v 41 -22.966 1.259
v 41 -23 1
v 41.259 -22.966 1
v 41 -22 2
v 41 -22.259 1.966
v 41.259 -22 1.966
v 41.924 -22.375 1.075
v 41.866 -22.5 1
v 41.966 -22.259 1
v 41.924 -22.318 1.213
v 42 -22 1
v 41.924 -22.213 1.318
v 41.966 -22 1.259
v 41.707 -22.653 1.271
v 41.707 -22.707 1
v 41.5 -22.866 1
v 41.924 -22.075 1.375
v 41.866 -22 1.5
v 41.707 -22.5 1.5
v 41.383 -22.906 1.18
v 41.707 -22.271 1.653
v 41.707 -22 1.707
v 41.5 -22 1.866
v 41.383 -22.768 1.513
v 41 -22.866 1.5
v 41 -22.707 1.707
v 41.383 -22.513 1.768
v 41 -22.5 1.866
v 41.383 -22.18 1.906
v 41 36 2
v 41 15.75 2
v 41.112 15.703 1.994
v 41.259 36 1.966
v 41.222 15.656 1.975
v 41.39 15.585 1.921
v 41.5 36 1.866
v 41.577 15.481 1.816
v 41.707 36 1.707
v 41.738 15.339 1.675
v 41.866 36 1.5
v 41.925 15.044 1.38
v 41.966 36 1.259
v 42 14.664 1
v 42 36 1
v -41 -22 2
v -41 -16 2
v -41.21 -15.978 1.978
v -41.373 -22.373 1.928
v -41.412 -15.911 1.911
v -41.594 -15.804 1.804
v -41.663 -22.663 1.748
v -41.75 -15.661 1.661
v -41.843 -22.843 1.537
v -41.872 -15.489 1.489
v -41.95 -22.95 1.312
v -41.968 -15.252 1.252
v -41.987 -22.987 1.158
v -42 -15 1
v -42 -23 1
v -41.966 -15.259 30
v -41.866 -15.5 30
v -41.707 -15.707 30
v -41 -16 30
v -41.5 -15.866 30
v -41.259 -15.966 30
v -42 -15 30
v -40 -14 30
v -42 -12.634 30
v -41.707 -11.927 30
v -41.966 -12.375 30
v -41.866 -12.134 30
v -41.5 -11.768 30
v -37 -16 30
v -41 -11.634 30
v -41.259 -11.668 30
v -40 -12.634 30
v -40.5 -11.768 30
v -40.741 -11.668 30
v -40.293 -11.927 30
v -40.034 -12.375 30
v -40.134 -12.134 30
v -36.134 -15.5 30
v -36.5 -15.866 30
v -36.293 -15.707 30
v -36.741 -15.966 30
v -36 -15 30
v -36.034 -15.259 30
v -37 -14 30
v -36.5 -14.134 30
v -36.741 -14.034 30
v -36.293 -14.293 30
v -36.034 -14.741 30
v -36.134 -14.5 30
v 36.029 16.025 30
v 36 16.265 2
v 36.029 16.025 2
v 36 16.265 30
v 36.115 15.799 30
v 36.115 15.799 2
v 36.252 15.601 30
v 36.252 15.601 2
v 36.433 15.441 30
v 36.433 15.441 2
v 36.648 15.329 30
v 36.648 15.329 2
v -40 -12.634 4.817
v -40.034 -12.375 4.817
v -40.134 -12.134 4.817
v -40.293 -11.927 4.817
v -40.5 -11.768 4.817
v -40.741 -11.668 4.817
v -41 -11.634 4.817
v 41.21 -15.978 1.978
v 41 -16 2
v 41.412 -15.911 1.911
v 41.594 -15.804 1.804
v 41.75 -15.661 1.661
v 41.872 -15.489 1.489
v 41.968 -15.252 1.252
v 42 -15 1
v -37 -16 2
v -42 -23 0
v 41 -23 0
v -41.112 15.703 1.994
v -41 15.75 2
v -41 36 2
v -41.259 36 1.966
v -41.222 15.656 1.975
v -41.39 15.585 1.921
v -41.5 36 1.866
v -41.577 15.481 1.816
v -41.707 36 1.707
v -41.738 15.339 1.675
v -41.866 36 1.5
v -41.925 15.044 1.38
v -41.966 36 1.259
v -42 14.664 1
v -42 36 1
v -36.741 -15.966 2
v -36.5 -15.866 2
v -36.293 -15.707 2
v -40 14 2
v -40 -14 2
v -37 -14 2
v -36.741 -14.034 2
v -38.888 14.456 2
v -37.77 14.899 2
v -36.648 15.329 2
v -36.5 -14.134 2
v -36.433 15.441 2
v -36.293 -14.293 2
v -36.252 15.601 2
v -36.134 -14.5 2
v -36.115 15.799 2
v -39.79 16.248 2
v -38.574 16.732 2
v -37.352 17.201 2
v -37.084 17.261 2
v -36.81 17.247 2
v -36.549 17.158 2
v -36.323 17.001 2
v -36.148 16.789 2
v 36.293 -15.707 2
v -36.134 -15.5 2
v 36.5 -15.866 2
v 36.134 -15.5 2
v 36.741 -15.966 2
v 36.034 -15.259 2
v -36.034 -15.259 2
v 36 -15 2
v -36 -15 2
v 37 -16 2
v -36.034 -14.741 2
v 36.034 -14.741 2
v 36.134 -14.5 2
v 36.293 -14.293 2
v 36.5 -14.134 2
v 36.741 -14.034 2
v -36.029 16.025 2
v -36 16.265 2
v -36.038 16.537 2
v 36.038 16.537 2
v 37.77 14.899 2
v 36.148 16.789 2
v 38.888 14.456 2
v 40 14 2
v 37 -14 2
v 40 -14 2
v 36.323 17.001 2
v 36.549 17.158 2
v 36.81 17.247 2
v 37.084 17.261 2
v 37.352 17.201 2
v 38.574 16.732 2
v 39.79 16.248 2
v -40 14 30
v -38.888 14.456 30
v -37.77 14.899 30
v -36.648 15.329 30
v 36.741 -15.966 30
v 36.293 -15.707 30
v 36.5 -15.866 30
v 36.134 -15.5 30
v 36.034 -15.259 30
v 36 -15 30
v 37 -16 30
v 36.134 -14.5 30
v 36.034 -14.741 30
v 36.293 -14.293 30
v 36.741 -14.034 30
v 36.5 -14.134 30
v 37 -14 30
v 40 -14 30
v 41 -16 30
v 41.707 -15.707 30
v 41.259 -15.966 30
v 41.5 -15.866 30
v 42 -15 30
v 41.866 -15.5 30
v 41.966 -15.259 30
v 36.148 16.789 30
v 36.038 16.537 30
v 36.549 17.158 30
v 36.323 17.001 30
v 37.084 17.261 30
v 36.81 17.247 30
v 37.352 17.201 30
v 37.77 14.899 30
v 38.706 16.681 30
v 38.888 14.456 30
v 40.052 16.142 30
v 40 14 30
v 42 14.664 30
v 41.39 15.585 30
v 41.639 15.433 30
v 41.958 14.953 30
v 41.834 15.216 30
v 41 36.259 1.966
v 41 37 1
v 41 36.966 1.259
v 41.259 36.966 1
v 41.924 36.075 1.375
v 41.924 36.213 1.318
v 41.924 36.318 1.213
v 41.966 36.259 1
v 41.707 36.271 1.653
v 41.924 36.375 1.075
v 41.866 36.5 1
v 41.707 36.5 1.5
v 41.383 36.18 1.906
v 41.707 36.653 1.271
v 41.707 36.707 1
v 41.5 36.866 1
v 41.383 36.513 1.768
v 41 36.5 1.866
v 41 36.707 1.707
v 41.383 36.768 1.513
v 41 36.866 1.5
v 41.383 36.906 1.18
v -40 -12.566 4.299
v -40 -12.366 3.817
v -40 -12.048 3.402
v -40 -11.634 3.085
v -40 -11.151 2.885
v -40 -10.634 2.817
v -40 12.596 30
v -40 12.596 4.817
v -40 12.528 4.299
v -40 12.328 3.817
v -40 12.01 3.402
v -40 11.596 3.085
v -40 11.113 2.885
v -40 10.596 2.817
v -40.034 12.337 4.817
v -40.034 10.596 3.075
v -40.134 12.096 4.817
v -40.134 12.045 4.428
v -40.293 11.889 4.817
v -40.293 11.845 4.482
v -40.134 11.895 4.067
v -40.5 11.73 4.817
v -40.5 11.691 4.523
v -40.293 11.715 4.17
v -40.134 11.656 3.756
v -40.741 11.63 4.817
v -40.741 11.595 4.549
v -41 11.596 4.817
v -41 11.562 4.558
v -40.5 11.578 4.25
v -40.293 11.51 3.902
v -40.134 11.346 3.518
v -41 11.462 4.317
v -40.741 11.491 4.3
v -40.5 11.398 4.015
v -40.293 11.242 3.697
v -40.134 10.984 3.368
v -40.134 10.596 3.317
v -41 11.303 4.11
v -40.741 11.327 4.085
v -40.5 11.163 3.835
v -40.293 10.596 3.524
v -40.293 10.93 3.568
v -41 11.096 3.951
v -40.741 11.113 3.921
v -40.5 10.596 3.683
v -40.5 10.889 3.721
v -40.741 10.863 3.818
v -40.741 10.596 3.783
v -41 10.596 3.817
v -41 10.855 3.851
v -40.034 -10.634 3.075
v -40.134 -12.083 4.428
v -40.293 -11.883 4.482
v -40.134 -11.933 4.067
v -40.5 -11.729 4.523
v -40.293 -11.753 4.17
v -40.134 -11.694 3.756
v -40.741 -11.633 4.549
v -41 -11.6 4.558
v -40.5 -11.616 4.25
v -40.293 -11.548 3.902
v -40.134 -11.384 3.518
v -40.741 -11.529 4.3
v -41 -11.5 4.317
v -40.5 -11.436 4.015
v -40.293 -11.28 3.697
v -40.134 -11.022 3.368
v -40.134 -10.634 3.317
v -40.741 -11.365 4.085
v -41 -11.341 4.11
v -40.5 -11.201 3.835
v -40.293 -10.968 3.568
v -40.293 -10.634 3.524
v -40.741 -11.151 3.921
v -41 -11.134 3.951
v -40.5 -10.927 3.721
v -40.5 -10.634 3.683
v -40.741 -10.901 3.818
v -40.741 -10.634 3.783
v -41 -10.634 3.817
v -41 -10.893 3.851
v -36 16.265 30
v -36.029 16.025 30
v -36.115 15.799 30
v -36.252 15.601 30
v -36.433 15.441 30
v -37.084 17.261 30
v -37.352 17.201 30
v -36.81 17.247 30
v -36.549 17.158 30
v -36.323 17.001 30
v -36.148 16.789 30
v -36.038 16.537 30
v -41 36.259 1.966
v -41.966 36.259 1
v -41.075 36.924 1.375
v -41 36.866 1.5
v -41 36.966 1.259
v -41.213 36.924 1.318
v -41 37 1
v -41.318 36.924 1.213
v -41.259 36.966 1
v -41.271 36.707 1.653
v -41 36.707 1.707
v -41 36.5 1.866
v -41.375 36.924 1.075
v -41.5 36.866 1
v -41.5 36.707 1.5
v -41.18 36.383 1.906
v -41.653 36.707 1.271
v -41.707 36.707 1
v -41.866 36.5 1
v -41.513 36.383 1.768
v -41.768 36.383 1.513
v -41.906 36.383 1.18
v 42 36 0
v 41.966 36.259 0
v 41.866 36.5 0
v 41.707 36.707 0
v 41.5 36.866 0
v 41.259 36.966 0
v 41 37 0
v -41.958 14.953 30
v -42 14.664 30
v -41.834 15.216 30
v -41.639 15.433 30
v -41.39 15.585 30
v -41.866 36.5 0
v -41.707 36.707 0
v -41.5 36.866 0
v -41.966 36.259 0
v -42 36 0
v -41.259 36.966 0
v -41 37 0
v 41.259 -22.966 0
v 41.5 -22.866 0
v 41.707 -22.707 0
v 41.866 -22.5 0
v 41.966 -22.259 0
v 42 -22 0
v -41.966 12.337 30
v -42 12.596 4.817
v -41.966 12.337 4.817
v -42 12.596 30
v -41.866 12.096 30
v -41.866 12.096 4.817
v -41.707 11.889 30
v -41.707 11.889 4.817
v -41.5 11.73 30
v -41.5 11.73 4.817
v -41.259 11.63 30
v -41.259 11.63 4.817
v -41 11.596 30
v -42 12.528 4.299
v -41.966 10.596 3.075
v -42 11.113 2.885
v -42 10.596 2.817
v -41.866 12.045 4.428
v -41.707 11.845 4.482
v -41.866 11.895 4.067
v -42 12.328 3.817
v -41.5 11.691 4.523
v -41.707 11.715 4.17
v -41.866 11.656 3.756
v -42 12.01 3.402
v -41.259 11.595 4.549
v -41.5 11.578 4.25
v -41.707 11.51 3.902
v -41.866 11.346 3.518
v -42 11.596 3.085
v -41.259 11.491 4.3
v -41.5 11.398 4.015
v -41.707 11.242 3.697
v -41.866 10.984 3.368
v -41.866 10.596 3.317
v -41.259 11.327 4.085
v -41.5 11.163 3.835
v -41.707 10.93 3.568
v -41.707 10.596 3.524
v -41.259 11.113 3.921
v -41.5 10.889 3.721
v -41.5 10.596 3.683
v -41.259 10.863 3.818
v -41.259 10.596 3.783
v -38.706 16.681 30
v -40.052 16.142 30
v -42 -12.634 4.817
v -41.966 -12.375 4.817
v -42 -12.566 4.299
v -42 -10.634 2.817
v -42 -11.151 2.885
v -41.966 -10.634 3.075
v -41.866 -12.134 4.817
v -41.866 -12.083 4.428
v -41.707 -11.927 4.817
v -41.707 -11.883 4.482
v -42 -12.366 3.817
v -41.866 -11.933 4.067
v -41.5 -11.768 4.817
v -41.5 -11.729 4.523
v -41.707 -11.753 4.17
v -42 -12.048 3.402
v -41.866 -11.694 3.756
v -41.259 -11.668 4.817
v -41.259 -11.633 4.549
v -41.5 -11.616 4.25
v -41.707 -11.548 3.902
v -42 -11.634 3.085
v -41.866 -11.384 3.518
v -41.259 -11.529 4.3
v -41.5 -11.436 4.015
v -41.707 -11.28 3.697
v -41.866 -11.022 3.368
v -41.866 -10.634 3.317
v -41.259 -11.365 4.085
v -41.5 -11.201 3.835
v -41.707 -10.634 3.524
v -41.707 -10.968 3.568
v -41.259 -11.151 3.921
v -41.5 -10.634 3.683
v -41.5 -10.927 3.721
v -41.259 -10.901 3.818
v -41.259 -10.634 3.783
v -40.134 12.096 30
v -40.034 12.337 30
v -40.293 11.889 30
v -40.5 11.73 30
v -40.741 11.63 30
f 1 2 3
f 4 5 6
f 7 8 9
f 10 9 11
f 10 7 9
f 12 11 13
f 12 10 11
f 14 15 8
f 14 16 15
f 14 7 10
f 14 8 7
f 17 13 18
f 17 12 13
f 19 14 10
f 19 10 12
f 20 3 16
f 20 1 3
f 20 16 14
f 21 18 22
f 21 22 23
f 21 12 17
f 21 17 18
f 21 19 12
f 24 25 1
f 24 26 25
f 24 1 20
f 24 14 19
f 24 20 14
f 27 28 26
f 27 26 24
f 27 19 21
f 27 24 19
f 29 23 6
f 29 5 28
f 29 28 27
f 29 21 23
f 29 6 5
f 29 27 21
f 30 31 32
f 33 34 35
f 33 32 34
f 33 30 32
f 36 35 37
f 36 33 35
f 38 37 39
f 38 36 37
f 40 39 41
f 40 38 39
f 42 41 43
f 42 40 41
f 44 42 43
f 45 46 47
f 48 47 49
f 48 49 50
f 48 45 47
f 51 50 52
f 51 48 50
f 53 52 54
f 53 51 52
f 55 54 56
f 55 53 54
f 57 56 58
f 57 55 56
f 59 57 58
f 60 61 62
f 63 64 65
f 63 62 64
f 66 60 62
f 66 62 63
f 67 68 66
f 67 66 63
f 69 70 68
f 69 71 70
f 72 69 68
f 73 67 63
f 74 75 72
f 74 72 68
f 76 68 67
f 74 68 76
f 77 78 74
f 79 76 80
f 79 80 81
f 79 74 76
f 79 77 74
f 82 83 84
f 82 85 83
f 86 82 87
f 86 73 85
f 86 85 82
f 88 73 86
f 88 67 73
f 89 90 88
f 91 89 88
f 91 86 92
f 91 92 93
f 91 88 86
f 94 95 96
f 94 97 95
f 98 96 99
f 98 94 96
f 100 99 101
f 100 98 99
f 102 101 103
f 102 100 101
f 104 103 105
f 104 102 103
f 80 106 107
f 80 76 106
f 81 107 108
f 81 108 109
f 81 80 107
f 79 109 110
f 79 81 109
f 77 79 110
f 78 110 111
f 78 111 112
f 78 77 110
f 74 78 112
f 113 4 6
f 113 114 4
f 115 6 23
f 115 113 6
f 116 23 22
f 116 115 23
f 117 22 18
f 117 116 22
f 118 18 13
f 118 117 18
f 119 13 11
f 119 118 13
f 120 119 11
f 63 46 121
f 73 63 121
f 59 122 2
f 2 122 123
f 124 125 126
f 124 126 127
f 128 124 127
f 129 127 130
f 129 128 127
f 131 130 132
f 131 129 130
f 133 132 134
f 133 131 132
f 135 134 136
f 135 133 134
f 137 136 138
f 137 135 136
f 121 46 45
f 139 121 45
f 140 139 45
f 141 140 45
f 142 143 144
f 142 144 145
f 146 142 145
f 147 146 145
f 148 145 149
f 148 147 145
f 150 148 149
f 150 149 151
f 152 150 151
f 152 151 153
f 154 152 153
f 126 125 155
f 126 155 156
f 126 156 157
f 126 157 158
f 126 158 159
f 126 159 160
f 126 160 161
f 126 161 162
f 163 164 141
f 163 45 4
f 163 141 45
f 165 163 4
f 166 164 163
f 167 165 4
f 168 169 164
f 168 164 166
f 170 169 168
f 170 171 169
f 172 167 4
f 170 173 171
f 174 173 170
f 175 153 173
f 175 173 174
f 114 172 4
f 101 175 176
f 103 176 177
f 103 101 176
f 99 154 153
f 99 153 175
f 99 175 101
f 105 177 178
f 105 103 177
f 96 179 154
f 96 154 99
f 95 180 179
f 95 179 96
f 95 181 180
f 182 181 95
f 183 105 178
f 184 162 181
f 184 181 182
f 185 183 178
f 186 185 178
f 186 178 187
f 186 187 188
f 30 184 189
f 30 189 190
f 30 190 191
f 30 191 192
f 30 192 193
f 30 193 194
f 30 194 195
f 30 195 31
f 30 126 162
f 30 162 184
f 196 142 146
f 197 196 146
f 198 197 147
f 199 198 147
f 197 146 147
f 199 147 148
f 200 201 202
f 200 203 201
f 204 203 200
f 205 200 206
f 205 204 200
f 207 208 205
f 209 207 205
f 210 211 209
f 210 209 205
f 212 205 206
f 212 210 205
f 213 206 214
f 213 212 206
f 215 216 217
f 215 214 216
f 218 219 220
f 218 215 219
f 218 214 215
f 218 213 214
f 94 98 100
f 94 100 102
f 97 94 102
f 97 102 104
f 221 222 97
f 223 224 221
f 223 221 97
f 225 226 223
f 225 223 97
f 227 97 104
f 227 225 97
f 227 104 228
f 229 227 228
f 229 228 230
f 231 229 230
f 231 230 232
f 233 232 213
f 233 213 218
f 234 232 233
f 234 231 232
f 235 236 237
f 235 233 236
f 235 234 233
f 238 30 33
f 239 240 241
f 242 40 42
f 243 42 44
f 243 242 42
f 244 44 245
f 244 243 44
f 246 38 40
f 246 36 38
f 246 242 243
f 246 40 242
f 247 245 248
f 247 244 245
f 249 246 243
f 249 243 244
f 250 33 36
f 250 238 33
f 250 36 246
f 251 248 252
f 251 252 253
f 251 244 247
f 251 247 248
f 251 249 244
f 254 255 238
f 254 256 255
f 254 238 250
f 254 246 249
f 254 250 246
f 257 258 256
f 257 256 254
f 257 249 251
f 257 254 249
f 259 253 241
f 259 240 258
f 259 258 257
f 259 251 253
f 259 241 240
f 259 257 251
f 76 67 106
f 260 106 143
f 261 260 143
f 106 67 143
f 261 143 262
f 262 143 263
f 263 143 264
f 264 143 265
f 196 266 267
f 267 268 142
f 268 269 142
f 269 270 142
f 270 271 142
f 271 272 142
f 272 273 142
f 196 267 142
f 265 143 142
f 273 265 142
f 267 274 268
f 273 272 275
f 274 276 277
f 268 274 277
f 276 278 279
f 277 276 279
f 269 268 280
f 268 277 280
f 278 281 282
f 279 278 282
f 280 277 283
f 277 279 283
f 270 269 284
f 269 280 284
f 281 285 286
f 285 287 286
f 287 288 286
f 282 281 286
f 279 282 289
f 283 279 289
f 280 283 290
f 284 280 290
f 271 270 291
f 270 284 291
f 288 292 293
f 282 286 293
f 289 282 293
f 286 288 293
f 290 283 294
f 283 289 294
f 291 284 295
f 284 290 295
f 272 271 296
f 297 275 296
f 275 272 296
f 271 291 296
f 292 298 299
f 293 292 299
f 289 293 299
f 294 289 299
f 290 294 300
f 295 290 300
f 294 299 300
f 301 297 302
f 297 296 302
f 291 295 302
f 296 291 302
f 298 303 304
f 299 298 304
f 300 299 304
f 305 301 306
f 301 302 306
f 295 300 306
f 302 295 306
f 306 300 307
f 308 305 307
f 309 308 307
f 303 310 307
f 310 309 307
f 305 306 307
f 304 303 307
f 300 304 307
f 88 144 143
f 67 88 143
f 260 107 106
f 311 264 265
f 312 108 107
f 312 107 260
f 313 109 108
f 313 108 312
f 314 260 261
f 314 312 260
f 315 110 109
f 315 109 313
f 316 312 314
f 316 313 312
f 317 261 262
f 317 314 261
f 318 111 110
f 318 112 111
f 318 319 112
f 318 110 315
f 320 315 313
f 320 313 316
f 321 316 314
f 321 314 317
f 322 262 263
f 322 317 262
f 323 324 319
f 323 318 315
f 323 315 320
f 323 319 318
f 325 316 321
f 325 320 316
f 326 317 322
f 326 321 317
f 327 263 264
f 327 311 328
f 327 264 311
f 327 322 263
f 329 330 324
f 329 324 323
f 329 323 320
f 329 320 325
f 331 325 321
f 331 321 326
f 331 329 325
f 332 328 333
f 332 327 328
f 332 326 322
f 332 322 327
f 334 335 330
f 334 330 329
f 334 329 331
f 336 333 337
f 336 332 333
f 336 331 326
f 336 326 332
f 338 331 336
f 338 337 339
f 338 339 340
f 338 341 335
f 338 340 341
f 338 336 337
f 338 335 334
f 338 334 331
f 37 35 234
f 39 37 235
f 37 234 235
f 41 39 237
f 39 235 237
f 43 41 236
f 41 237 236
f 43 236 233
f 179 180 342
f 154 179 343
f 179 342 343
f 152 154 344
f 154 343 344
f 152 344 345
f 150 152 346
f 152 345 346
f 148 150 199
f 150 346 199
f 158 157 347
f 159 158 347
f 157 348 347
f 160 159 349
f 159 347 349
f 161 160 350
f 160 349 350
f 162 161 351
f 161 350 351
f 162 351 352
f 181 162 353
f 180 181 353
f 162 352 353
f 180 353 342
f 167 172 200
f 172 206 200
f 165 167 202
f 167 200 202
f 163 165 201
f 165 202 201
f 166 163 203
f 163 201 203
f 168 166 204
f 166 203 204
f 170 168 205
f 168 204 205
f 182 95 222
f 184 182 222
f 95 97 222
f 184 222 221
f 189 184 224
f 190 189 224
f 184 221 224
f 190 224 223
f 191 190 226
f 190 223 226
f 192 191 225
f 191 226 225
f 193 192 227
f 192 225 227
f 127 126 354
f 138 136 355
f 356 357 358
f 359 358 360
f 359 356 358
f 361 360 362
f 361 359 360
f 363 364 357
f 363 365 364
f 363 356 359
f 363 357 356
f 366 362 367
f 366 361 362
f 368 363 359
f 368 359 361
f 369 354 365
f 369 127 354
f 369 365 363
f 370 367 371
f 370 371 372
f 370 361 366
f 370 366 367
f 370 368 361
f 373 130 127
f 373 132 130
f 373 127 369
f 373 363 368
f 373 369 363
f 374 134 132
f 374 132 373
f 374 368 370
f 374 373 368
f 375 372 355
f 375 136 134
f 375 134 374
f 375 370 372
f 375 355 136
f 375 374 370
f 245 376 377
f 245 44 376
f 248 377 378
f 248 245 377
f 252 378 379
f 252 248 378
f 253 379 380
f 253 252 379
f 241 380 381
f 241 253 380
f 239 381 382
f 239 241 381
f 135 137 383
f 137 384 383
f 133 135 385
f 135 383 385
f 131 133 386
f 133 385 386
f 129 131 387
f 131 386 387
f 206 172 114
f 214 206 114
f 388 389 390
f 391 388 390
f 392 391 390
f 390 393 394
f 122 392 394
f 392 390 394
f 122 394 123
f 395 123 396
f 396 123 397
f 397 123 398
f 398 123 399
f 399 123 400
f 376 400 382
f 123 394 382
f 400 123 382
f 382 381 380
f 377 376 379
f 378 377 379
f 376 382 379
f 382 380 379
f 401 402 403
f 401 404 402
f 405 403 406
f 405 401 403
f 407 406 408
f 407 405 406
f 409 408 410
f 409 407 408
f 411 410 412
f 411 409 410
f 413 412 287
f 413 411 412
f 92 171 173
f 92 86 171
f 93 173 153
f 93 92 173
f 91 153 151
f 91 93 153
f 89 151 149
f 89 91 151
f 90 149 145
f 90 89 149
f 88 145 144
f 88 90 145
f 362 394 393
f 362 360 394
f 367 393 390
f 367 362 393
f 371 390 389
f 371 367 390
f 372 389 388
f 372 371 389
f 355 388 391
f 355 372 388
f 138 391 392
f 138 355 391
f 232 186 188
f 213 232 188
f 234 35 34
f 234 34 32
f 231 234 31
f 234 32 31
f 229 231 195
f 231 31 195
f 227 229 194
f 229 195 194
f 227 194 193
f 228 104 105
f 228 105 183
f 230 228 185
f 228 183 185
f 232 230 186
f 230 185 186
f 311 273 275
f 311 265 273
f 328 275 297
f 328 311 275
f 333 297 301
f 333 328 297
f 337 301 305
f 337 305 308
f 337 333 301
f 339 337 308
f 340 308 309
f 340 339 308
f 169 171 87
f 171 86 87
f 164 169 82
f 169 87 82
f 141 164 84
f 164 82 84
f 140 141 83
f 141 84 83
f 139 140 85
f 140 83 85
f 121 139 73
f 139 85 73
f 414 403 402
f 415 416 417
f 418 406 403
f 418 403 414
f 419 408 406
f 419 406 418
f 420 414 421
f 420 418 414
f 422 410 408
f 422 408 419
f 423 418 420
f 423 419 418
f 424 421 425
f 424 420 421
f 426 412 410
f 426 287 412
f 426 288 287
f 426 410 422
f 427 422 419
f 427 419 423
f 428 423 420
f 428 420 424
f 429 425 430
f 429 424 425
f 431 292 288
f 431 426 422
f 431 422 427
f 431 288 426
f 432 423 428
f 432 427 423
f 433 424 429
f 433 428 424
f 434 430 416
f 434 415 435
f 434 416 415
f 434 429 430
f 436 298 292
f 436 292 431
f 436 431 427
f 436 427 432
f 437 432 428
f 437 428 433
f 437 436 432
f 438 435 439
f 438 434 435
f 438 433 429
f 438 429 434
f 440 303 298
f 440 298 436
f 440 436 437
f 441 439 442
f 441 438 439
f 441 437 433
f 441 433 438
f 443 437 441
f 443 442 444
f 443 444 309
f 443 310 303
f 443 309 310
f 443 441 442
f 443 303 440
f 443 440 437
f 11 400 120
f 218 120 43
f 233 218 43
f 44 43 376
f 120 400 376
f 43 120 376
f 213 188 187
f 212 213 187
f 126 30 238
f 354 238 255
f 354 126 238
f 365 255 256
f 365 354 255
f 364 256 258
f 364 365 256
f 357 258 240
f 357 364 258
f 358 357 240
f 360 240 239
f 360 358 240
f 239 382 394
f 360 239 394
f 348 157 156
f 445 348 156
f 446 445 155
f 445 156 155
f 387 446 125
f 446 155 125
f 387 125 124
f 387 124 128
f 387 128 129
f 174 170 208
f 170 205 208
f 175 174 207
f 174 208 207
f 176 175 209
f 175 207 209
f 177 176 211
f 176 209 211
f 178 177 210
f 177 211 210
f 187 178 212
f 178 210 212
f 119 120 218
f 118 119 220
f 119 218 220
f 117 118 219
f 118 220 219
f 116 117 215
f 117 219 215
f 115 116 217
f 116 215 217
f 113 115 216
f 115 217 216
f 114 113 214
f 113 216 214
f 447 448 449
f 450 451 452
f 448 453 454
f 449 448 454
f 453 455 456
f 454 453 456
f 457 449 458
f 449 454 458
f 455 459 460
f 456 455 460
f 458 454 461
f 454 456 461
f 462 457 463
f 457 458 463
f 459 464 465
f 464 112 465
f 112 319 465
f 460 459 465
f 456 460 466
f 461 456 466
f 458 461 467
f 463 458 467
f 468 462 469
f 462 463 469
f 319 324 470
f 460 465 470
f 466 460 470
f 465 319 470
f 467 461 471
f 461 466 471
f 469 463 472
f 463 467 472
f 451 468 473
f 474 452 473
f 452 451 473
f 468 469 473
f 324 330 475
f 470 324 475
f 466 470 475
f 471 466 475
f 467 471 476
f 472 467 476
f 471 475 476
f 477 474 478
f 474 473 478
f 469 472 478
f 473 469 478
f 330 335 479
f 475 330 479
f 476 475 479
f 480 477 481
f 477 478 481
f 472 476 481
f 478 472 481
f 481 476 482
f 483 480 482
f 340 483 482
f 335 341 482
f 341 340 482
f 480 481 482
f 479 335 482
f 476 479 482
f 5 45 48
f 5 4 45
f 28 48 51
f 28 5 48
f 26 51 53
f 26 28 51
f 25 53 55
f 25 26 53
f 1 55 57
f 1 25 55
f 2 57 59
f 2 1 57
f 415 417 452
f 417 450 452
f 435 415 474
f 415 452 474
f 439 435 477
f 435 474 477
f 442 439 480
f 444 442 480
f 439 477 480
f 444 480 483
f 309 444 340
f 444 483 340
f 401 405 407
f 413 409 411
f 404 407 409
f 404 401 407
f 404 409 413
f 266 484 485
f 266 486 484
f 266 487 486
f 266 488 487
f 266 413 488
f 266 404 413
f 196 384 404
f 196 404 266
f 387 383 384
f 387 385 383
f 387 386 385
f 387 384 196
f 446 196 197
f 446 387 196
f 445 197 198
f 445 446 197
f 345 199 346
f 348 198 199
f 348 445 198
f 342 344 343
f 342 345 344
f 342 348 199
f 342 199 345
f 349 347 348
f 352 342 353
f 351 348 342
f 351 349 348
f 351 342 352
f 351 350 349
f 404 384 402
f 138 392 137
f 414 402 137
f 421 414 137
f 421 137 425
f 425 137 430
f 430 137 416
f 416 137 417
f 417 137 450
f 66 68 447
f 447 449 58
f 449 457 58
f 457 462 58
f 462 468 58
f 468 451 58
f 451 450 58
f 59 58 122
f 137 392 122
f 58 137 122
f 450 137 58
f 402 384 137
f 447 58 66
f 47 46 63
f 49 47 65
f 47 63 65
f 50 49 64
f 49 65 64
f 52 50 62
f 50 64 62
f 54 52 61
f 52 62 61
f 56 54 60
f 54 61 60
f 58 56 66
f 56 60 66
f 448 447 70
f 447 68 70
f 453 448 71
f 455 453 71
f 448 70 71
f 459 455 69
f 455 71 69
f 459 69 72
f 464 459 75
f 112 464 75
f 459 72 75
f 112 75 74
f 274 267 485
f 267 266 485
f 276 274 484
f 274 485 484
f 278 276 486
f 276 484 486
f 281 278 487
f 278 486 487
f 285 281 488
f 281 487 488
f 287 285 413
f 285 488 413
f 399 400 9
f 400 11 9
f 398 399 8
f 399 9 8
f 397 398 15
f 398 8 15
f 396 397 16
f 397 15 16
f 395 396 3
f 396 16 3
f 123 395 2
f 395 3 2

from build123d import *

# Parameters (mm, degrees)
F0_W     = 72
F0_H     = 2
F1_DEPTH = 2
F2_DEPTH = 30
F3_W     = 23.2293857262
F3_H     = 26.1833476555
F4_DEPTH = 2
F5_R     = 0.99999


# Not quite as in the source:
# - a fillet or chamfer is up to 0.001 mm smaller than in the source, because OpenCascade refuses the exact size


with BuildPart() as f1:
    # F0 (on Top) → F1 (new body)
    with BuildSketch(Plane.XY):
        with BuildLine():
            ThreePointArc((-36, 15.5704873412), (0, 22), (36, 15.5704873412))
            Line((36, 15.5704873412), (36, 17.6995486449))
            ThreePointArc((36, 17.6995486449), (0, 24), (-36, 17.6995486449))
            Line((-36, 17.6995486449), (-36, 15.5704873412))
        make_face()
        with BuildLine():
            Line((-40, 14), (40, 14))
            ThreePointArc((40, 14), (38.0081123923, 14.8059057722), (36, 15.5704873412))
            ThreePointArc((36, 15.5704873412), (0, 22), (-36, 15.5704873412))
            ThreePointArc((-36, 15.5704873412), (-38.0081123923, 14.8059057722), (-40, 14))
        make_face()
        Polygon((36, -14), (40, -14), (40, 14), (-40, 14), (-40, -14), (-36, -14), align=None)
        with Locations((0, -15)):
            Rectangle(F0_W, F0_H)
        with BuildLine():
            ThreePointArc((-36, 17.6995486449), (0, 24), (36, 17.6995486449))
            ThreePointArc((36, 17.6995486449), (39.0180800363, 16.5575437512), (42, 15.3242004848))
            Line((42, 15.3242004848), (42, 37))
            Line((42, 37), (-42, 37))
            Line((-42, 37), (-42, 15.3242004848))
            ThreePointArc((-42, 15.3242004848), (-39.0180800363, 16.5575437512), (-36, 17.6995486449))
        make_face()
        Polygon((42, -16), (36, -16), (-36, -16), (-42, -16), (-42, -23), (42, -23), align=None)
    extrude(amount=F1_DEPTH)

    # F0 (on Top) → F2 (join)
    with BuildSketch(Plane.XY):
        with BuildLine():
            Line((-36, -16), (-36, -14))
            Line((-36, -14), (-40, -14))
            Line((-40, -14), (-40, 14))
            ThreePointArc((-40, 14), (-38.0081123923, 14.8059057722), (-36, 15.5704873412))
            Line((-36, 15.5704873412), (-36, 17.6995486449))
            ThreePointArc((-36, 17.6995486449), (-39.0180800363, 16.5575437512), (-42, 15.3242004848))
            Line((-42, 15.3242004848), (-42, -16))
            Line((-42, -16), (-36, -16))
        make_face()
        with BuildLine():
            Line((40, 14), (40, -14))
            Line((40, -14), (36, -14))
            Line((36, -14), (36, -16))
            Line((36, -16), (42, -16))
            Line((42, -16), (42, 15.3242004848))
            ThreePointArc((42, 15.3242004848), (39.0180800363, 16.5575437512), (36, 17.6995486449))
            Line((36, 17.6995486449), (36, 15.5704873412))
            ThreePointArc((36, 15.5704873412), (38.0081123923, 14.8059057722), (40, 14))
        make_face()
    extrude(amount=F2_DEPTH)

    # F3 (on face) → F4 (cut, through all)
    with BuildSketch(Plane(origin=(-42, 0, 0), x_dir=(0, -1, 0), z_dir=(-1, 0, 0))):
        with Locations((0.0190031715, 16.9083261723)):
            Rectangle(F3_W, F3_H)
    extrude(amount=-F4_DEPTH, mode=Mode.SUBTRACT)

    # F5 (radius 1 in the source; OpenCascade refuses exactly that, so slightly less here)
    f5_edges = [f1.edges().sort_by_distance(p)[0] for p in [
        (0, -23, 2),
        (42, -23, 1),
        (42, -19.5, 2),
        (-42, -19.5, 2),
        (-42, 26.1621, 2),
        (0, 37, 2),
        (-42, 37, 1),
        (42, 26.1621, 2),
        (42, 37, 1),
        (42, 15.3242, 16),
        (42, -16, 16),
        (36, 17.699549, 16),
        (36, 15.570487, 16),
        (36, -16, 16),
        (36, -14, 16),
        (-42, 15.3242, 16),
        (-36, 17.699549, 16),
        (-42, 11.59569, 16.908326),
        (-42, -11.633696, 16.908326),
        (-42, -16, 16),
        (-36, -16, 16),
        (-36, -14, 16),
        (-36, 15.570487, 16),
        (-40, -11.633696, 16.908326),
        (-40, 11.59569, 16.908326),
        (-42, -0.019003, 3.816652),
        (-40, -0.019003, 3.816652),
        (-41, -11.633696, 3.816652),
        (-41, 11.59569, 3.816652),
    ]]
    fillet(f5_edges, radius=F5_R)


solid = f1.part
